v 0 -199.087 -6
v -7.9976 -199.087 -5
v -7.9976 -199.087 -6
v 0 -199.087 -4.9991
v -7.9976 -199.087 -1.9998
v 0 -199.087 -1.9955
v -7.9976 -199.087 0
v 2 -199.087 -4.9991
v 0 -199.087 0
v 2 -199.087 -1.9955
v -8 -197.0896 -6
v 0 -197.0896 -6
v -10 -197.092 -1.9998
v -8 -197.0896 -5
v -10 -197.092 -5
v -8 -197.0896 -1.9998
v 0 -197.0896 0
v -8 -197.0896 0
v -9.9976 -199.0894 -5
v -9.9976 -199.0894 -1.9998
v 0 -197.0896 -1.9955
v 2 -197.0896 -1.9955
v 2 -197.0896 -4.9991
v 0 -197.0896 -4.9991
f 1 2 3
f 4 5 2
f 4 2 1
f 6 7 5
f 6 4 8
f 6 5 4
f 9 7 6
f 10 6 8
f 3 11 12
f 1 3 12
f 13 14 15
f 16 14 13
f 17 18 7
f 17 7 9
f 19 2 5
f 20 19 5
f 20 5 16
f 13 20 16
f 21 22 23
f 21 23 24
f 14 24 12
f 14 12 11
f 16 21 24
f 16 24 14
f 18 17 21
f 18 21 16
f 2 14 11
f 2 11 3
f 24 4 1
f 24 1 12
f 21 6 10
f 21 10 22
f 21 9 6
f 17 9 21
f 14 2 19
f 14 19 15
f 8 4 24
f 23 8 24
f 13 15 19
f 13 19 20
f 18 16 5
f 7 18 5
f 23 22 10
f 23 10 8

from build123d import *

# Parameters (mm, degrees)
DODANIE_WYCI_GNI_CIE1_DEPTH = 6
SZKIC2_W                    = 3.003669228
SZKIC2_H                    = 1.997379701
DODANIE_WYCI_GNI_CIE2_DEPTH = 2
SZKIC3_W                    = 3.00029081
SZKIC3_H                    = 1.99738112
DODANIE_WYCI_GNI_CIE3_DEPTH = 2


with BuildPart() as part:
    # Szkic1 → Dodanie-wyciągnięcie1 (new body)
    with BuildSketch(Plane.XY):
        Polygon((0, -199.086972688), (0, -197.089592987), (-8, -197.089592987), (-7.997619842, -199.086972688), align=None)
    extrude(amount=-DODANIE_WYCI_GNI_CIE1_DEPTH)

    # Szkic2 → Dodanie-wyciągnięcie2 (add)
    with BuildSketch(Plane(origin=(0, 0, 0), x_dir=(0, 0, -1), z_dir=(1, 0, 0))):
        with Locations((3.49731299, -198.088282838)):
            Rectangle(SZKIC2_W, SZKIC2_H)
    extrude(amount=DODANIE_WYCI_GNI_CIE2_DEPTH)

    # Szkic3 → Dodanie-wyciągnięcie3 (add)
    with BuildSketch(Plane(origin=(-8.234848226, -0.009812978, 0), x_dir=(0, 0, 1), z_dir=(-0.99999929, -0.00119164, 0))):
        with Locations((-3.499897311, -198.078610496)):
            Rectangle(SZKIC3_W, SZKIC3_H)
    extrude(amount=DODANIE_WYCI_GNI_CIE3_DEPTH)


solid = part.part
